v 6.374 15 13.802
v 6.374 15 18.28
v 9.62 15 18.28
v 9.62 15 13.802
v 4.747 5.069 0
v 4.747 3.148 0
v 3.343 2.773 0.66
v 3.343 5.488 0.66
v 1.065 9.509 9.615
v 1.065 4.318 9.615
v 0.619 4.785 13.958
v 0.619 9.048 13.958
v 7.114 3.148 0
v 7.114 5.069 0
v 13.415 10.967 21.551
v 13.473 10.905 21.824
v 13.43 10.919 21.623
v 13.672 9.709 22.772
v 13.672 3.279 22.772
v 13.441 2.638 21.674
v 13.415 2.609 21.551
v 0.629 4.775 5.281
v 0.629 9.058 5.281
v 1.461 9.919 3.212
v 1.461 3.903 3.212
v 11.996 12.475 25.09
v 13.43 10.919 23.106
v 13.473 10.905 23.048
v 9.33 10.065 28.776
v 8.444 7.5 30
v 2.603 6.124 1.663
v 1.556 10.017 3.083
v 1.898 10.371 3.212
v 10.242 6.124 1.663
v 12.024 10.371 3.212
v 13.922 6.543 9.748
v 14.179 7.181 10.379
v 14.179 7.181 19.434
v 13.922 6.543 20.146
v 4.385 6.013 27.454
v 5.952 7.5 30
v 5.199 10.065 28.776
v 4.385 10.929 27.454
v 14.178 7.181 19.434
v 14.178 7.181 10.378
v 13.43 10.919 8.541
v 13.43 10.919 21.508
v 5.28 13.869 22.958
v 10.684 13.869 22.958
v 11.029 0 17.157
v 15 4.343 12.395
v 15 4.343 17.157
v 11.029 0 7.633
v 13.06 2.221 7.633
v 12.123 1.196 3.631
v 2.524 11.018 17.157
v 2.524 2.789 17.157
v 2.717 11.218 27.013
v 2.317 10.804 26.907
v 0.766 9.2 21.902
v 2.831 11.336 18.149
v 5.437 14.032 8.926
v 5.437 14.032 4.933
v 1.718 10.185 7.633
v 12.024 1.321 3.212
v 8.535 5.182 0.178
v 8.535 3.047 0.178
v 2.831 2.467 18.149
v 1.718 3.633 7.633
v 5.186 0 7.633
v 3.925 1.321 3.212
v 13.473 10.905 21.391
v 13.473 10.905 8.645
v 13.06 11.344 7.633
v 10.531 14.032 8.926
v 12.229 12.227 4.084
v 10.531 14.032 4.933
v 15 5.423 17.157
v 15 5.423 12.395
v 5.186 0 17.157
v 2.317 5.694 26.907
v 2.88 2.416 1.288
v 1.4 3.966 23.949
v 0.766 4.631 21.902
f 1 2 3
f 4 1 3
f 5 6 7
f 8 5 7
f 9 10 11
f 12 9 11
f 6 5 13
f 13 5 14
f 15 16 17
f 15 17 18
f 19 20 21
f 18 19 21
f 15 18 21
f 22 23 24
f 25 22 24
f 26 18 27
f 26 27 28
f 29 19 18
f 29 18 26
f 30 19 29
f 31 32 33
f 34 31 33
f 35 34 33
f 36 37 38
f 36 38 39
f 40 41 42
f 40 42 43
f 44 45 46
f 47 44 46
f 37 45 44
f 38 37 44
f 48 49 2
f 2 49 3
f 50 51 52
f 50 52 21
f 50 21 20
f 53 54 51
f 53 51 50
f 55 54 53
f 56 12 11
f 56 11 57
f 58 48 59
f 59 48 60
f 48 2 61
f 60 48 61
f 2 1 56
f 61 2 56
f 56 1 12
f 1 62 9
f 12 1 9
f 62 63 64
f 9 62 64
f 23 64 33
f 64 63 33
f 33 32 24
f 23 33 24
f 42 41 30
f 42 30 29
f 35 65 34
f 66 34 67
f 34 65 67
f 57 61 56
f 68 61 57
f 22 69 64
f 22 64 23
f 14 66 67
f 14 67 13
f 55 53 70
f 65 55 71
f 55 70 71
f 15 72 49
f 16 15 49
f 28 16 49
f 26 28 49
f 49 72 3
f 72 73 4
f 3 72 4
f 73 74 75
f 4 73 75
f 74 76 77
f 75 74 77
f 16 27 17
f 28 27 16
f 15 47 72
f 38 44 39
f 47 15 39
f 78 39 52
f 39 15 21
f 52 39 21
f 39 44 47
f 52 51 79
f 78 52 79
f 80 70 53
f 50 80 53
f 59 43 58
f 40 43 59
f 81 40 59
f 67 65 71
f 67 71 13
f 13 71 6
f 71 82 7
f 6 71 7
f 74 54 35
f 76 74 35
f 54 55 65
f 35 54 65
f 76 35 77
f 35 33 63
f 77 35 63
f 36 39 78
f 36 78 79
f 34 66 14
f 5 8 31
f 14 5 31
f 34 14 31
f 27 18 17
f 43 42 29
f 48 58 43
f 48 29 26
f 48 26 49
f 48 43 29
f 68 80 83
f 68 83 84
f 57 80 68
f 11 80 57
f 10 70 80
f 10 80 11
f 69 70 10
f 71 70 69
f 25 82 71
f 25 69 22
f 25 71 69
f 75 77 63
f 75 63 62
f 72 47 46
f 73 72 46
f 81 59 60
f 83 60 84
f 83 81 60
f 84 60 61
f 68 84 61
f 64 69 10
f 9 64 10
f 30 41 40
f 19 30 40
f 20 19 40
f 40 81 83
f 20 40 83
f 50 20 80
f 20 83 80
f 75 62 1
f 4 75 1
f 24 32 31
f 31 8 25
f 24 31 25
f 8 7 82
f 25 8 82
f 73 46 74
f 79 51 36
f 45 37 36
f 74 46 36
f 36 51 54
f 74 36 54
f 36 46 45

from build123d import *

# Parameters (mm, degrees)
ESQUISSE1_W              = 15
ESQUISSE1_H              = 15
BOSS_EXTRU_1_DEPTH       = 30
ENL_V_MAT_EXTRU_1_DEPTH  = 30
ENL_V_MAT_EXTRU_2_DEPTH  = 30
ENL_V_MAT_EXTRU_3_DEPTH  = 30
ENL_V_MAT_EXTRU_5_DEPTH  = 30
ENL_V_MAT_EXTRU_7_DEPTH  = 30
ENL_V_MAT_EXTRU_8_DEPTH  = 30
ENL_V_MAT_EXTRU_13_DEPTH = 30
ENL_V_MAT_EXTRU_15_DEPTH = 30
ENL_V_MAT_EXTRU_16_DEPTH = 30
ENL_V_MAT_EXTRU_17_DEPTH = 30
ENL_V_MAT_EXTRU_18_DEPTH = 30
ENL_V_MAT_EXTRU_19_DEPTH = 30
ENL_V_MAT_EXTRU_20_DEPTH = 30
ENL_V_MAT_EXTRU_21_DEPTH = 30
ENL_V_MAT_EXTRU_22_DEPTH = 30
ENL_V_MAT_EXTRU_23_DEPTH = 30
ENL_V_MAT_EXTRU_25_DEPTH = 30
ENL_V_MAT_EXTRU_26_DEPTH = 30


with BuildPart() as part:
    # Esquisse1 → Boss.-Extru.1 (new body)
    with BuildSketch(Plane.XY):
        with Locations((7.5, 7.5)):
            Rectangle(ESQUISSE1_W, ESQUISSE1_H)
    extrude(amount=BOSS_EXTRU_1_DEPTH)

    # Esquisse2 → Enlèv. mat.-Extru.1 (cut)
    with BuildSketch(Plane.ZY):
        Polygon((30, 7.5), (17.157208733, 0), (30, 0), align=None)
    extrude(amount=-ENL_V_MAT_EXTRU_1_DEPTH, mode=Mode.SUBTRACT)

    # Esquisse3 → Enlèv. mat.-Extru.2 (cut)
    with BuildSketch(Plane.ZY):
        Polygon((30, 7.5), (28.775513666, 10.065015711), (21.227680677, 15), (30, 15), align=None)
    extrude(amount=-ENL_V_MAT_EXTRU_2_DEPTH, mode=Mode.SUBTRACT)

    # Esquisse4 → Enlèv. mat.-Extru.3 (cut)
    with BuildSketch(Plane.ZY):
        Polygon((8.926273351, 14.031560197), (13.802198678, 15), (0, 15), (0, 5.06907595), (1.662878512, 6.124252415), (3.211780908, 10.370740256), (4.932627015, 14.031560197), align=None)
        Polygon((3.211780908, 1.321204417), (0, 3.148377639), (0, 0), (7.632757812, 0), align=None)
    extrude(amount=-ENL_V_MAT_EXTRU_3_DEPTH, mode=Mode.SUBTRACT)

    # Esquisse5 → Enlèv. mat.-Extru.5 (cut, along a direction that is not the sketch's normal)
    with BuildSketch(Plane(origin=(0, -7.471488968, 4.363238964), x_dir=(-1, 0, 0), z_dir=(0, -0.863533803, 0.504290959))):
        Polygon((-5.951727483, -29.68819628), (-4.385417014, -26.739512451), (-2.316517921, -26.106069571), (-0.765937965, -20.310025776), (-2.831147462, -15.964380335), (-2.523882774, -14.815829705), (0, -14.815829705), (0, -29.68819628), align=None)
    extrude(amount=-ENL_V_MAT_EXTRU_5_DEPTH, dir=(0, -1, 0), mode=Mode.SUBTRACT)

    # Esquisse6 → Enlèv. mat.-Extru.7 (cut)
    with BuildSketch(Plane(origin=(0, 0, 0), x_dir=(-1, 0, 0), z_dir=(0, -1, 0))):
        Polygon((-0.619141534, -13.957767105), (-2.523882774, -17.157208733), (0, -17.157208733), (0, -7.632757812), (-1.718091984, -7.632757812), (-1.06476411, -9.614809502), align=None)
    extrude(amount=-ENL_V_MAT_EXTRU_7_DEPTH, mode=Mode.SUBTRACT)

    # Esquisse8 → Enlèv. mat.-Extru.8 (cut, along a direction that is not the sketch's normal)
    with BuildSketch(Plane(origin=(0, 2.094023155, 0.625796674), x_dir=(1, 0, 0), z_dir=(0, -0.958129282, -0.286335954))):
        Polygon((1.718091984, 7.313168763), (0.628646684, 4.858294572), (1.46050531, 2.698993008), (0, 2.698993008), (0, 7.313168763), align=None)
    extrude(amount=-ENL_V_MAT_EXTRU_8_DEPTH, dir=(0, -1, 0), mode=Mode.SUBTRACT)

    # Esquisse9 → Enlèv. mat.-Extru.13 (cut, along a direction that is not the sketch's normal)
    with BuildSketch(Plane(origin=(0, 2.378568206, 1.353160834), x_dir=(1, 0, 0), z_dir=(0, -0.869189347, -0.494479401))):
        Polygon((9.741570256, -1.177126716), (7.1144792, -1.556807891), (15, -1.556807891), (15, 2.138337382), (14.506645575, 0.943189576), (12.940964542, -0.714733234), align=None)
        Polygon((3.343379322, -0.797445542), (1.46050531, 2.138337382), (0, 2.138337382), (0, -1.556807891), (4.746944503, -1.556807891), align=None)
    extrude(amount=-ENL_V_MAT_EXTRU_13_DEPTH, dir=(0, -1, 0), mode=Mode.SUBTRACT)

    # Esquisse12 → Enlèv. mat.-Extru.15 (cut, along a direction that is not the sketch's normal)
    with BuildSketch(Plane(origin=(0, -7.471488968, 4.363238964), x_dir=(-1, 0, 0), z_dir=(0, -0.863533803, 0.504290959))):
        Polygon((-9.673460517, -29.68819628), (-12.650110774, -26.711546023), (-14.179932039, -24.105910496), (-13.415021407, -19.903610966), (-15, -14.815829705), (-15, -29.68819628), align=None)
    extrude(amount=-ENL_V_MAT_EXTRU_15_DEPTH, dir=(0, -1, 0), mode=Mode.SUBTRACT)

    # Esquisse13 → Enlèv. mat.-Extru.16 (cut)
    with BuildSketch(Plane(origin=(0, 0, 0), x_dir=(-1, 0, 0), z_dir=(0, -1, 0))):
        Polygon((-15, -12.394983272), (-13.060300751, -7.632757812), (-15, -7.632757812), align=None)
    extrude(amount=-ENL_V_MAT_EXTRU_16_DEPTH, mode=Mode.SUBTRACT)

    # Esquisse14 → Enlèv. mat.-Extru.17 (cut, along a direction that is not the sketch's normal)
    with BuildSketch(Plane(origin=(0, 2.094023155, 0.625796674), x_dir=(1, 0, 0), z_dir=(0, -0.958129282, -0.286335954))):
        Polygon((13.060300751, 7.313168763), (12.024477505, 2.698993008), (15, 2.698993008), (15, 7.313168763), align=None)
    extrude(amount=-ENL_V_MAT_EXTRU_17_DEPTH, dir=(0, -1, 0), mode=Mode.SUBTRACT)

    # Esquisse15 → Enlèv. mat.-Extru.18 (cut, along a direction that is not the sketch's normal)
    with BuildSketch(Plane(origin=(0, 2.378568206, 1.353160834), x_dir=(-1, 0, 0), z_dir=(0, -0.869189347, -0.494479401))):
        Polygon((-12.024477505, -2.138337382), (-8.534571531, 1.351568592), (-12.940964542, 0.714733234), (-14.506645575, -0.943189576), (-15, -2.138337382), align=None)
    extrude(amount=-ENL_V_MAT_EXTRU_18_DEPTH, dir=(0, -1, 0), mode=Mode.SUBTRACT)

    # Esquisse16 → Enlèv. mat.-Extru.19 (cut)
    with BuildSketch(Plane(origin=(0, 0, 0), x_dir=(-1, 0, 0), z_dir=(0, 0, -1))):
        Polygon((-15.396052436, 8.861198197), (-9.123900072, 15.526897376), (-16.183146066, 15.526897376), align=None)
    extrude(amount=-ENL_V_MAT_EXTRU_19_DEPTH, mode=Mode.SUBTRACT)

    # Esquisse17 → Enlèv. mat.-Extru.20 (cut)
    with BuildSketch(Plane(origin=(0, 0, 0), x_dir=(-1, 0, 0), z_dir=(0, 0, -1))):
        Polygon((-6.554218331, 15.18646123), (0.669203066, 7.716085255), (0.669203066, 16.0713818), align=None)
    extrude(amount=-ENL_V_MAT_EXTRU_20_DEPTH, mode=Mode.SUBTRACT)

    # Esquisse18 → Enlèv. mat.-Extru.21 (cut)
    with BuildSketch(Plane(origin=(0, 0, 0), x_dir=(-1, 0, 0), z_dir=(0, 0, -1))):
        Polygon((-15, 9.21839227), (-13.921696564, 6.543051012), (-15.506321771, 4.89668716), (-10.237957447, -0.865586318), (-16.387206956, -0.590246788), (-18.552094895, 8.703903566), (-15.878103341, 10.779733946), align=None)
    extrude(amount=-ENL_V_MAT_EXTRU_21_DEPTH, mode=Mode.SUBTRACT)

    # Esquisse19 → Enlèv. mat.-Extru.22 (cut)
    with BuildSketch(Plane(origin=(0, 0, 0), x_dir=(-1, 0, 0), z_dir=(0, 0, -1))):
        Polygon((-5.875093242, -0.721529481), (0.175293911, 5.616971345), (0.854418999, -0.577472644), (-3.508445206, -1.482972763), align=None)
    extrude(amount=-ENL_V_MAT_EXTRU_22_DEPTH, mode=Mode.SUBTRACT)

    # Esquisse20 → Enlèv. mat.-Extru.23 (cut)
    with BuildSketch(Plane.XZ):
        Polygon((14.641535391, 21.431582068), (7.416422476, 31.42072399), (22.821492514, 29.700662918), (19.193376306, 23.52642454), align=None)
    extrude(amount=-ENL_V_MAT_EXTRU_23_DEPTH, mode=Mode.SUBTRACT)

    # Esquisse21 → Enlèv. mat.-Extru.25 (cut)
    with BuildSketch(Plane(origin=(15, 0, 0), x_dir=(0, 0, -1), z_dir=(1, 0, 0))):
        Polygon((-25.251513547, 13.314322934), (-17.635021909, 15.155835068), (-22.650414381, 16.308069891), (-25.79170864, 15.548569091), align=None)
    extrude(amount=-ENL_V_MAT_EXTRU_25_DEPTH, mode=Mode.SUBTRACT)

    # Esquisse22 → Enlèv. mat.-Extru.26 (cut)
    with BuildSketch(Plane(origin=(0, 0, 0), x_dir=(-1, 0, 0), z_dir=(0, 0, -1))):
        Polygon((-14.178463775, 7.180628802), (-13.430249604, 10.918734357), (-15.892886638, 10.134258582), (-16.358917462, 7.805951421), align=None)
    extrude(amount=-ENL_V_MAT_EXTRU_26_DEPTH, mode=Mode.SUBTRACT)


solid = part.part
